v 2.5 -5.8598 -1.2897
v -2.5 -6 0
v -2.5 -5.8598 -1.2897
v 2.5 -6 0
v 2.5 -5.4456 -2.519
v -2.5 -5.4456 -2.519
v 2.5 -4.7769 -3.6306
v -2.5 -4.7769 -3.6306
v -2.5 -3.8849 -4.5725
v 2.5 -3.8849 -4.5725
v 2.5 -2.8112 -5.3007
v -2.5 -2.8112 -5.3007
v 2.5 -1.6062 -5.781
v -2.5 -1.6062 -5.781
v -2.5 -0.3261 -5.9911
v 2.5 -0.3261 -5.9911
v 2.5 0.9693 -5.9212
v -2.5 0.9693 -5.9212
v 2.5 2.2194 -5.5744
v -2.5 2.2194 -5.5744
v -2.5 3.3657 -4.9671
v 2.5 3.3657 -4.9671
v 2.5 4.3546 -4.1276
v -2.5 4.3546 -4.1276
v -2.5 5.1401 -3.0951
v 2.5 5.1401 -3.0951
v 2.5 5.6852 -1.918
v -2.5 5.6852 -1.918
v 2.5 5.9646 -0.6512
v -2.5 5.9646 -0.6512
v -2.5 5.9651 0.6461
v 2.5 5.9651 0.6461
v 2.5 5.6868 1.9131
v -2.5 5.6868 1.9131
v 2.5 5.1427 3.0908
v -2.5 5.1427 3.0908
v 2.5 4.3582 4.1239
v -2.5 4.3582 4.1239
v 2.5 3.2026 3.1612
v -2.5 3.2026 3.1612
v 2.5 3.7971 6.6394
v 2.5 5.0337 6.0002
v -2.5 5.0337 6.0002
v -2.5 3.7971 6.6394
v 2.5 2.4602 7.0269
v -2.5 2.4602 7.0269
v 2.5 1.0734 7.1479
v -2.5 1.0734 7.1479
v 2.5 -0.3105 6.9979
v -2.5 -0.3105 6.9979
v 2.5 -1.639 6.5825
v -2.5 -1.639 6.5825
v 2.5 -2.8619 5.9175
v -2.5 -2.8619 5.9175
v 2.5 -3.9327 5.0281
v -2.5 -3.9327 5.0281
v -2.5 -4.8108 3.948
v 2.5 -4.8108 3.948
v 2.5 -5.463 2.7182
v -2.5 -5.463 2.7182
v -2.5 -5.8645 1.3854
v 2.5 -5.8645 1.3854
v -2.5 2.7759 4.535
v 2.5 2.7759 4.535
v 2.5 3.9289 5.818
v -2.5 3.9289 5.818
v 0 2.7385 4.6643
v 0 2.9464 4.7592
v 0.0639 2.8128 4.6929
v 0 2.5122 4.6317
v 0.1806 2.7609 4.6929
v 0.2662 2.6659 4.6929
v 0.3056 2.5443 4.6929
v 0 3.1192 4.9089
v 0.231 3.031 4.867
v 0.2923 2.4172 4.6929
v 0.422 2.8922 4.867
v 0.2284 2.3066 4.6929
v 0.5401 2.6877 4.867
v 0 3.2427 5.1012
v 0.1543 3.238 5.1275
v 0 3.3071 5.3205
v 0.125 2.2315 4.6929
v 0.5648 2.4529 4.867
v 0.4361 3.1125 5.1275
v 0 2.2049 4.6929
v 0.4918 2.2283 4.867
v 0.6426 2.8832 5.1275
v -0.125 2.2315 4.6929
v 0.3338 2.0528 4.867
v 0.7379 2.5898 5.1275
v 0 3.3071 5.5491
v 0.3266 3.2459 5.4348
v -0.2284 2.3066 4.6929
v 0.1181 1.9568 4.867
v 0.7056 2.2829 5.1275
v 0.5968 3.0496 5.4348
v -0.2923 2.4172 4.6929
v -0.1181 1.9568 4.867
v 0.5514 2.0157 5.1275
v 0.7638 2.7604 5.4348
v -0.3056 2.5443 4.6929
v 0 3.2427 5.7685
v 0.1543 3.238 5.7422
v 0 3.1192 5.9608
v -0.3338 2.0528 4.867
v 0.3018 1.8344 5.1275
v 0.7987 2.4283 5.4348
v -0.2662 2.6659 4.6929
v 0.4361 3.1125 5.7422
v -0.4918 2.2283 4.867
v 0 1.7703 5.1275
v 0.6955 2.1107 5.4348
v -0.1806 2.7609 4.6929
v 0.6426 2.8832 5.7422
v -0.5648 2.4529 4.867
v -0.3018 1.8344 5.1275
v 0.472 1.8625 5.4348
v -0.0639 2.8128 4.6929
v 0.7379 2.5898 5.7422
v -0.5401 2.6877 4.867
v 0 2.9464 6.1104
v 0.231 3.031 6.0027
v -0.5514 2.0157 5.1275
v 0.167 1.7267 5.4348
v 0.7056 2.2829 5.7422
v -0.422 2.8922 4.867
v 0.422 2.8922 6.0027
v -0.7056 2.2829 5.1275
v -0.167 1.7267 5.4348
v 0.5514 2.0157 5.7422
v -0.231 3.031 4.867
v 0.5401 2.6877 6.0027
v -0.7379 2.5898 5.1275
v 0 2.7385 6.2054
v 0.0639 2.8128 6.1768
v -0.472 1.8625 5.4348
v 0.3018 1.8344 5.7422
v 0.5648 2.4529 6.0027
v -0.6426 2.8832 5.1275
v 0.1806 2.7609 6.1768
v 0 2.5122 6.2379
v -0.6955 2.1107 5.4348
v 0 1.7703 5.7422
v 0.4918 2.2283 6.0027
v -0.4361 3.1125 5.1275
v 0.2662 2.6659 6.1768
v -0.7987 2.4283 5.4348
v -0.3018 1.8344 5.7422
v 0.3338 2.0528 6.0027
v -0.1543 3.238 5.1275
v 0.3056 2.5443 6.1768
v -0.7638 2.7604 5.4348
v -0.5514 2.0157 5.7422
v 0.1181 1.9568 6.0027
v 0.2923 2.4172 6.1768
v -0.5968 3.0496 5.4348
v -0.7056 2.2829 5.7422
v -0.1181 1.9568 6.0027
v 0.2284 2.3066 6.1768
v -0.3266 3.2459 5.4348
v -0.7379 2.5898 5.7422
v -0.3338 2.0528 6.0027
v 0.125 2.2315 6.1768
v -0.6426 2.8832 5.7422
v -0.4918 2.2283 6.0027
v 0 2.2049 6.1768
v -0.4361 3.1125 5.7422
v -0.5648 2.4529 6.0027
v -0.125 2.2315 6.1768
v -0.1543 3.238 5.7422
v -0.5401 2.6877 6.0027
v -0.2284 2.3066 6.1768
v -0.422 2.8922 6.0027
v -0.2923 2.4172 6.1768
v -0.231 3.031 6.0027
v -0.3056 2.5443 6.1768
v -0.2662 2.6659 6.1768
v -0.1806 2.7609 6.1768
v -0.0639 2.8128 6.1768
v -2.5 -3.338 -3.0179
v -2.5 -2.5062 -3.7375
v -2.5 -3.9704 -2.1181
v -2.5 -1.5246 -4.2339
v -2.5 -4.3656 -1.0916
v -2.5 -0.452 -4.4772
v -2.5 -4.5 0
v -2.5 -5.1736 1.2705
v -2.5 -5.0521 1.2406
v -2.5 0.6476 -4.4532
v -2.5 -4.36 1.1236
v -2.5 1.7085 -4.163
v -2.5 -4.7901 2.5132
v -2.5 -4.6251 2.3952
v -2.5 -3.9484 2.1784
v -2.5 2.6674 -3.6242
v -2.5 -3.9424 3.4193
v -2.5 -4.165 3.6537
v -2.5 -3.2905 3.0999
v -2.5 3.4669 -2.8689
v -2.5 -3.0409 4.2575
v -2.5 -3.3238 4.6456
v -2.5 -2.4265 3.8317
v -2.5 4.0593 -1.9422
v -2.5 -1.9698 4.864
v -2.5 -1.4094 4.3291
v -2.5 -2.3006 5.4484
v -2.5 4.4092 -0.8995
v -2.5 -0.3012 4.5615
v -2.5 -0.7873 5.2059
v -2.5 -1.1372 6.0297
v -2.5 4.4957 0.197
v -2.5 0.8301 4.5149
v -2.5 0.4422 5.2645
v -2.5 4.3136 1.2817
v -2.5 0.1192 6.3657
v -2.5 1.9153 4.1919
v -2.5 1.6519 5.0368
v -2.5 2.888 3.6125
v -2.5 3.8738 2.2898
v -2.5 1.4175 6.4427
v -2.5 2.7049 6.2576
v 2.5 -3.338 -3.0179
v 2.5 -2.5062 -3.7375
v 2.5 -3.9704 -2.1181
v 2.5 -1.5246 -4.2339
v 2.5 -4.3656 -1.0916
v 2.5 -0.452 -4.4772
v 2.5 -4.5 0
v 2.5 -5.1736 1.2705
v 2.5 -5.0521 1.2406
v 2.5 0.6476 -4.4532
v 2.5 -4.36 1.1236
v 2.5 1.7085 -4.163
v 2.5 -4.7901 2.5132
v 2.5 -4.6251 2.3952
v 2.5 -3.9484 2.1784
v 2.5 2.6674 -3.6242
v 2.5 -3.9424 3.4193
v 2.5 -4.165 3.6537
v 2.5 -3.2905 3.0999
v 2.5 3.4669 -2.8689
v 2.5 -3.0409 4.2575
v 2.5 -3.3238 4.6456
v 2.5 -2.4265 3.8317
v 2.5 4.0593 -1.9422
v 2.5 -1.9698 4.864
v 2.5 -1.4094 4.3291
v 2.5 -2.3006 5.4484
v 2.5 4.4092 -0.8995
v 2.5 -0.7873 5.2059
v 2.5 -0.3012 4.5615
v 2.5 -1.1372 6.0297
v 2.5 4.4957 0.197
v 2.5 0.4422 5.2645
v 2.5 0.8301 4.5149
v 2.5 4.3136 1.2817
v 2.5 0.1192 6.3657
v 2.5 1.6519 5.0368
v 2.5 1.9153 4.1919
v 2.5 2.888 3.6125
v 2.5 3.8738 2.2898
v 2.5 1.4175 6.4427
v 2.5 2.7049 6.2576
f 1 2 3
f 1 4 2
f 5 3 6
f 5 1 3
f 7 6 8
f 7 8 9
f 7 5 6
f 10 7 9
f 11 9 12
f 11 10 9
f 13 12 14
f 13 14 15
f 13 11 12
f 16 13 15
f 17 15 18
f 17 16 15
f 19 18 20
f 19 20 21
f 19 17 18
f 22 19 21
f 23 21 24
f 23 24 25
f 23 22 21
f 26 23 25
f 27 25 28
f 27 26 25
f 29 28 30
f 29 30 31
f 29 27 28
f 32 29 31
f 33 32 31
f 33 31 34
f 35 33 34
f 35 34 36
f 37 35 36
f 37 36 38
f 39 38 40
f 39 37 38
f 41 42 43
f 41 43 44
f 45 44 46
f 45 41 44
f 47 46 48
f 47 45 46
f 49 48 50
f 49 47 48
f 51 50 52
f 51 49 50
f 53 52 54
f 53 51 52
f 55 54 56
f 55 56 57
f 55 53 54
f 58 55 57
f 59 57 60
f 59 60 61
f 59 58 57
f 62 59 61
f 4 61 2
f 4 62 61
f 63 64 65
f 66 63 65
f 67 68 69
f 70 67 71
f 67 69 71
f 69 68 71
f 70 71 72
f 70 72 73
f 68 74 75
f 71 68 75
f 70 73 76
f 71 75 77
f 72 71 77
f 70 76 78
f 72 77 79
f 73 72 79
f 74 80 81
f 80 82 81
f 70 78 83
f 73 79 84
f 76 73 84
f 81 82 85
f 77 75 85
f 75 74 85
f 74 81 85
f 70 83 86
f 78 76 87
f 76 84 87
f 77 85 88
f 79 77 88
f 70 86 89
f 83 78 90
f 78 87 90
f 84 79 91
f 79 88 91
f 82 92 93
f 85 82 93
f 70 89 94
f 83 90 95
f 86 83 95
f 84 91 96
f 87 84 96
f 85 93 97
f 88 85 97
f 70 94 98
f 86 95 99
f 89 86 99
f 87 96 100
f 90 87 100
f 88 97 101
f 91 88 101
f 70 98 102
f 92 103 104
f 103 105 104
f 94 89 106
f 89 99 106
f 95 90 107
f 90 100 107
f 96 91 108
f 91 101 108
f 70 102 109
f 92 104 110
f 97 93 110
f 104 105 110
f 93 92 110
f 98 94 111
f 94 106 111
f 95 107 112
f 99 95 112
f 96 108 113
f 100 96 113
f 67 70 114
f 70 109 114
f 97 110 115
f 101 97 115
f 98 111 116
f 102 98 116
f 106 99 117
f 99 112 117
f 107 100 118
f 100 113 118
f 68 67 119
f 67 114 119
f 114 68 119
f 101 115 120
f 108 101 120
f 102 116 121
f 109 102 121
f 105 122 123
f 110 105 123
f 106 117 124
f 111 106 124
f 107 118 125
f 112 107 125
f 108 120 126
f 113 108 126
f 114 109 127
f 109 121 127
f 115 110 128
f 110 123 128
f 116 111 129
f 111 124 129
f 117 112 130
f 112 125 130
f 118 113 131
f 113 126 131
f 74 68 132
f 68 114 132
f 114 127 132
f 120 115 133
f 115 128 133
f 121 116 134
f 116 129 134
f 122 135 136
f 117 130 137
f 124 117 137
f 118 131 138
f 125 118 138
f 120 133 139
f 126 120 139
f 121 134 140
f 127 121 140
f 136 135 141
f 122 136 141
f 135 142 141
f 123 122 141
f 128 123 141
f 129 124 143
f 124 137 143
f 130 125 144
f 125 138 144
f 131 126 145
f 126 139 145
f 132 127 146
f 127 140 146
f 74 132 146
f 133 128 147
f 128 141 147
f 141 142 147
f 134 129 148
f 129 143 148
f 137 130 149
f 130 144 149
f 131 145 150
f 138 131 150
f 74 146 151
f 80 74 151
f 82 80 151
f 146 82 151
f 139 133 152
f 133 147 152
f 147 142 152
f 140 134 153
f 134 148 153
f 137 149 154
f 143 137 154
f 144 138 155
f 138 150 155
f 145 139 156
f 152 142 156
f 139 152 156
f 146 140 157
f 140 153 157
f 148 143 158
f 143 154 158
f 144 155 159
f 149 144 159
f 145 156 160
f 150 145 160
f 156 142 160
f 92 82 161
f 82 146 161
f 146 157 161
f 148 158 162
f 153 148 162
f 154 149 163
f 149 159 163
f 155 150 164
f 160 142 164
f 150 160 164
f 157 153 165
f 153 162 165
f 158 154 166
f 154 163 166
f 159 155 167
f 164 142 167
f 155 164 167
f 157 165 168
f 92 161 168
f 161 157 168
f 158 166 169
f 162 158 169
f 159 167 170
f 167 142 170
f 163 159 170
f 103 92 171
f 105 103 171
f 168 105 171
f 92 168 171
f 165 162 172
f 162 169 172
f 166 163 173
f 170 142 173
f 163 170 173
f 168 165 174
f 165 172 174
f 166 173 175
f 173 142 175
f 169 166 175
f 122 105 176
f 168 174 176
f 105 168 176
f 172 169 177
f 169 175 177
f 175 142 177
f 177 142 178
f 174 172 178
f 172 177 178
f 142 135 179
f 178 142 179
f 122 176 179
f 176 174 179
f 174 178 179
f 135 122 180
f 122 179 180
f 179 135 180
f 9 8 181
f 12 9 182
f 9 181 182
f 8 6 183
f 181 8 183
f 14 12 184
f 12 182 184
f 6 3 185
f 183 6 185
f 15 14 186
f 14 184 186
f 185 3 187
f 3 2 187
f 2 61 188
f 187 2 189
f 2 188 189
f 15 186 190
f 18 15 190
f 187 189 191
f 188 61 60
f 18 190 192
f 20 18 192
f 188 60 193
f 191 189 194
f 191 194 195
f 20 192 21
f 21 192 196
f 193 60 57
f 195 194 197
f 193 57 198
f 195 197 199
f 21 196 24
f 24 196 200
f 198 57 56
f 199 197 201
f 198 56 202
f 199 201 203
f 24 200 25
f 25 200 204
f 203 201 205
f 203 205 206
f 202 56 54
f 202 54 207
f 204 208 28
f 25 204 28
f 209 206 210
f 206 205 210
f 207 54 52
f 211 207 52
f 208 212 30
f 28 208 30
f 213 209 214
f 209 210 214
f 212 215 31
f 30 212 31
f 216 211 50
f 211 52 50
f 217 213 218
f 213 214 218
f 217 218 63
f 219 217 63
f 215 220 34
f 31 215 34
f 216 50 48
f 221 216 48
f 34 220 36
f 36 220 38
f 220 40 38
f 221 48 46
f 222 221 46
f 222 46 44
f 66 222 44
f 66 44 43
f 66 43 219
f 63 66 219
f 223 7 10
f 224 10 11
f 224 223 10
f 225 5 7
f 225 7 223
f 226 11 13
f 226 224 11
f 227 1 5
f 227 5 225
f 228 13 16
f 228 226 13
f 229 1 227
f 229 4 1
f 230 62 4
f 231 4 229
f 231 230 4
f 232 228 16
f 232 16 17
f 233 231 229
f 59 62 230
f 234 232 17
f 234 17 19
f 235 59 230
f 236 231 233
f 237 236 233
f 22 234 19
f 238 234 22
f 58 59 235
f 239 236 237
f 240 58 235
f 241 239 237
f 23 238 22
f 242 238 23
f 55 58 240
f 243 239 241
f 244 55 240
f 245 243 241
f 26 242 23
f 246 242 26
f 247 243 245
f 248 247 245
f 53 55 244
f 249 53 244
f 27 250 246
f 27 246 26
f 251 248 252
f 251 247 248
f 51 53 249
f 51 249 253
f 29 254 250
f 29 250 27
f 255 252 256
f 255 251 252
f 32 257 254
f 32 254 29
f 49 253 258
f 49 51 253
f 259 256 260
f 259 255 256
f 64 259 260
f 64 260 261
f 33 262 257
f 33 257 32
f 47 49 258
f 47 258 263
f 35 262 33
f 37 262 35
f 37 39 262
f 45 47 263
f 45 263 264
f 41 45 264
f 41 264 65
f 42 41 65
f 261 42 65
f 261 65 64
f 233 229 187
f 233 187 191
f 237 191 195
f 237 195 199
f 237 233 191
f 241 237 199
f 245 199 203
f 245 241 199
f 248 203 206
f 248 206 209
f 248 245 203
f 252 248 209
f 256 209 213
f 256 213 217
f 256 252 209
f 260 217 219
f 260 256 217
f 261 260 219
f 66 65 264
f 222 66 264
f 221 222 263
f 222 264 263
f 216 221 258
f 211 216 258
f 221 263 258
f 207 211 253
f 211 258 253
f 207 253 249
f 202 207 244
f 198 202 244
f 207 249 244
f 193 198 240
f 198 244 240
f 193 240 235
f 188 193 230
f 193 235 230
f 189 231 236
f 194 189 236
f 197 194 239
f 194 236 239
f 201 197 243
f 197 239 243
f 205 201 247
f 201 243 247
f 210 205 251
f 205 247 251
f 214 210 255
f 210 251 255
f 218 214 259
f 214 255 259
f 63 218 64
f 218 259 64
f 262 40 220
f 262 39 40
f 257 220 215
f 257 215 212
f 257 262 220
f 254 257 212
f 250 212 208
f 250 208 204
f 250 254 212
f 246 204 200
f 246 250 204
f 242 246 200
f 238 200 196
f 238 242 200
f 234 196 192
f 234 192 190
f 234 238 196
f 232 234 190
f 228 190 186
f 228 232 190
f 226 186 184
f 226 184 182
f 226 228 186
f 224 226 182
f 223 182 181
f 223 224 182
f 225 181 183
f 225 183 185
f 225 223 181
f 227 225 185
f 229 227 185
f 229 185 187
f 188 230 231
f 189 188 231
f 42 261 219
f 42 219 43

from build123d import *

# Parameters (mm, degrees)
F1_DEPTH = 2.5
F4_DEPTH = 25


with BuildPart() as f1:
    # F0 (on Right) → F1 (new body, symmetric)
    with BuildSketch(Plane.YZ):
        with BuildLine():
            ThreePointArc((3.202643, 3.161183), (1.708524, -4.163045), (-4.5, 0))
            ThreePointArc((-4.5, 0), (-1.933398, 4.11196), (2.888029, 3.61246))
            Line((2.888029, 3.61246), (5.033673, 6.000177))
            ThreePointArc((5.033673, 6.000177), (-2.266695, 6.27981), (-6, 0))
            ThreePointArc((-6, 0), (2.219356, -5.574447), (4.358153, 4.123894))
            Line((4.358153, 4.123894), (3.202643, 3.161183))
        make_face()
    extrude(amount=F1_DEPTH, both=True)

    # F3 (on face) → F4 (cut)
    with BuildSketch(Plane.YZ.offset(2.5)):
        with BuildLine():
            Line((2.775889, 4.534951), (3.928859, 5.817999))
            ThreePointArc((3.928859, 5.817999), (-1.733582, 5.768479), (-5.173602, 1.270486))
            Line((-5.173602, 1.270486), (-5.052092, 1.240646))
            ThreePointArc((-5.052092, 1.240646), (-1.969769, 4.864021), (2.775889, 4.534951))
        make_face()
    extrude(amount=-F4_DEPTH, mode=Mode.SUBTRACT)


with BuildPart() as f6:
    # F5 (on Right) → F6 (revolve)
    with BuildSketch(Plane.YZ):
        with BuildLine():
            Line((2.512218, 6.237931), (2.512218, 4.631747))
            ThreePointArc((2.512218, 4.631747), (3.31531, 5.434839), (2.512218, 6.237931))
        make_face()
    revolve(axis=Axis((0, 2.512218, 5.434839), (0, 0, -1)))


solid = Compound([f1.part, f6.part])
